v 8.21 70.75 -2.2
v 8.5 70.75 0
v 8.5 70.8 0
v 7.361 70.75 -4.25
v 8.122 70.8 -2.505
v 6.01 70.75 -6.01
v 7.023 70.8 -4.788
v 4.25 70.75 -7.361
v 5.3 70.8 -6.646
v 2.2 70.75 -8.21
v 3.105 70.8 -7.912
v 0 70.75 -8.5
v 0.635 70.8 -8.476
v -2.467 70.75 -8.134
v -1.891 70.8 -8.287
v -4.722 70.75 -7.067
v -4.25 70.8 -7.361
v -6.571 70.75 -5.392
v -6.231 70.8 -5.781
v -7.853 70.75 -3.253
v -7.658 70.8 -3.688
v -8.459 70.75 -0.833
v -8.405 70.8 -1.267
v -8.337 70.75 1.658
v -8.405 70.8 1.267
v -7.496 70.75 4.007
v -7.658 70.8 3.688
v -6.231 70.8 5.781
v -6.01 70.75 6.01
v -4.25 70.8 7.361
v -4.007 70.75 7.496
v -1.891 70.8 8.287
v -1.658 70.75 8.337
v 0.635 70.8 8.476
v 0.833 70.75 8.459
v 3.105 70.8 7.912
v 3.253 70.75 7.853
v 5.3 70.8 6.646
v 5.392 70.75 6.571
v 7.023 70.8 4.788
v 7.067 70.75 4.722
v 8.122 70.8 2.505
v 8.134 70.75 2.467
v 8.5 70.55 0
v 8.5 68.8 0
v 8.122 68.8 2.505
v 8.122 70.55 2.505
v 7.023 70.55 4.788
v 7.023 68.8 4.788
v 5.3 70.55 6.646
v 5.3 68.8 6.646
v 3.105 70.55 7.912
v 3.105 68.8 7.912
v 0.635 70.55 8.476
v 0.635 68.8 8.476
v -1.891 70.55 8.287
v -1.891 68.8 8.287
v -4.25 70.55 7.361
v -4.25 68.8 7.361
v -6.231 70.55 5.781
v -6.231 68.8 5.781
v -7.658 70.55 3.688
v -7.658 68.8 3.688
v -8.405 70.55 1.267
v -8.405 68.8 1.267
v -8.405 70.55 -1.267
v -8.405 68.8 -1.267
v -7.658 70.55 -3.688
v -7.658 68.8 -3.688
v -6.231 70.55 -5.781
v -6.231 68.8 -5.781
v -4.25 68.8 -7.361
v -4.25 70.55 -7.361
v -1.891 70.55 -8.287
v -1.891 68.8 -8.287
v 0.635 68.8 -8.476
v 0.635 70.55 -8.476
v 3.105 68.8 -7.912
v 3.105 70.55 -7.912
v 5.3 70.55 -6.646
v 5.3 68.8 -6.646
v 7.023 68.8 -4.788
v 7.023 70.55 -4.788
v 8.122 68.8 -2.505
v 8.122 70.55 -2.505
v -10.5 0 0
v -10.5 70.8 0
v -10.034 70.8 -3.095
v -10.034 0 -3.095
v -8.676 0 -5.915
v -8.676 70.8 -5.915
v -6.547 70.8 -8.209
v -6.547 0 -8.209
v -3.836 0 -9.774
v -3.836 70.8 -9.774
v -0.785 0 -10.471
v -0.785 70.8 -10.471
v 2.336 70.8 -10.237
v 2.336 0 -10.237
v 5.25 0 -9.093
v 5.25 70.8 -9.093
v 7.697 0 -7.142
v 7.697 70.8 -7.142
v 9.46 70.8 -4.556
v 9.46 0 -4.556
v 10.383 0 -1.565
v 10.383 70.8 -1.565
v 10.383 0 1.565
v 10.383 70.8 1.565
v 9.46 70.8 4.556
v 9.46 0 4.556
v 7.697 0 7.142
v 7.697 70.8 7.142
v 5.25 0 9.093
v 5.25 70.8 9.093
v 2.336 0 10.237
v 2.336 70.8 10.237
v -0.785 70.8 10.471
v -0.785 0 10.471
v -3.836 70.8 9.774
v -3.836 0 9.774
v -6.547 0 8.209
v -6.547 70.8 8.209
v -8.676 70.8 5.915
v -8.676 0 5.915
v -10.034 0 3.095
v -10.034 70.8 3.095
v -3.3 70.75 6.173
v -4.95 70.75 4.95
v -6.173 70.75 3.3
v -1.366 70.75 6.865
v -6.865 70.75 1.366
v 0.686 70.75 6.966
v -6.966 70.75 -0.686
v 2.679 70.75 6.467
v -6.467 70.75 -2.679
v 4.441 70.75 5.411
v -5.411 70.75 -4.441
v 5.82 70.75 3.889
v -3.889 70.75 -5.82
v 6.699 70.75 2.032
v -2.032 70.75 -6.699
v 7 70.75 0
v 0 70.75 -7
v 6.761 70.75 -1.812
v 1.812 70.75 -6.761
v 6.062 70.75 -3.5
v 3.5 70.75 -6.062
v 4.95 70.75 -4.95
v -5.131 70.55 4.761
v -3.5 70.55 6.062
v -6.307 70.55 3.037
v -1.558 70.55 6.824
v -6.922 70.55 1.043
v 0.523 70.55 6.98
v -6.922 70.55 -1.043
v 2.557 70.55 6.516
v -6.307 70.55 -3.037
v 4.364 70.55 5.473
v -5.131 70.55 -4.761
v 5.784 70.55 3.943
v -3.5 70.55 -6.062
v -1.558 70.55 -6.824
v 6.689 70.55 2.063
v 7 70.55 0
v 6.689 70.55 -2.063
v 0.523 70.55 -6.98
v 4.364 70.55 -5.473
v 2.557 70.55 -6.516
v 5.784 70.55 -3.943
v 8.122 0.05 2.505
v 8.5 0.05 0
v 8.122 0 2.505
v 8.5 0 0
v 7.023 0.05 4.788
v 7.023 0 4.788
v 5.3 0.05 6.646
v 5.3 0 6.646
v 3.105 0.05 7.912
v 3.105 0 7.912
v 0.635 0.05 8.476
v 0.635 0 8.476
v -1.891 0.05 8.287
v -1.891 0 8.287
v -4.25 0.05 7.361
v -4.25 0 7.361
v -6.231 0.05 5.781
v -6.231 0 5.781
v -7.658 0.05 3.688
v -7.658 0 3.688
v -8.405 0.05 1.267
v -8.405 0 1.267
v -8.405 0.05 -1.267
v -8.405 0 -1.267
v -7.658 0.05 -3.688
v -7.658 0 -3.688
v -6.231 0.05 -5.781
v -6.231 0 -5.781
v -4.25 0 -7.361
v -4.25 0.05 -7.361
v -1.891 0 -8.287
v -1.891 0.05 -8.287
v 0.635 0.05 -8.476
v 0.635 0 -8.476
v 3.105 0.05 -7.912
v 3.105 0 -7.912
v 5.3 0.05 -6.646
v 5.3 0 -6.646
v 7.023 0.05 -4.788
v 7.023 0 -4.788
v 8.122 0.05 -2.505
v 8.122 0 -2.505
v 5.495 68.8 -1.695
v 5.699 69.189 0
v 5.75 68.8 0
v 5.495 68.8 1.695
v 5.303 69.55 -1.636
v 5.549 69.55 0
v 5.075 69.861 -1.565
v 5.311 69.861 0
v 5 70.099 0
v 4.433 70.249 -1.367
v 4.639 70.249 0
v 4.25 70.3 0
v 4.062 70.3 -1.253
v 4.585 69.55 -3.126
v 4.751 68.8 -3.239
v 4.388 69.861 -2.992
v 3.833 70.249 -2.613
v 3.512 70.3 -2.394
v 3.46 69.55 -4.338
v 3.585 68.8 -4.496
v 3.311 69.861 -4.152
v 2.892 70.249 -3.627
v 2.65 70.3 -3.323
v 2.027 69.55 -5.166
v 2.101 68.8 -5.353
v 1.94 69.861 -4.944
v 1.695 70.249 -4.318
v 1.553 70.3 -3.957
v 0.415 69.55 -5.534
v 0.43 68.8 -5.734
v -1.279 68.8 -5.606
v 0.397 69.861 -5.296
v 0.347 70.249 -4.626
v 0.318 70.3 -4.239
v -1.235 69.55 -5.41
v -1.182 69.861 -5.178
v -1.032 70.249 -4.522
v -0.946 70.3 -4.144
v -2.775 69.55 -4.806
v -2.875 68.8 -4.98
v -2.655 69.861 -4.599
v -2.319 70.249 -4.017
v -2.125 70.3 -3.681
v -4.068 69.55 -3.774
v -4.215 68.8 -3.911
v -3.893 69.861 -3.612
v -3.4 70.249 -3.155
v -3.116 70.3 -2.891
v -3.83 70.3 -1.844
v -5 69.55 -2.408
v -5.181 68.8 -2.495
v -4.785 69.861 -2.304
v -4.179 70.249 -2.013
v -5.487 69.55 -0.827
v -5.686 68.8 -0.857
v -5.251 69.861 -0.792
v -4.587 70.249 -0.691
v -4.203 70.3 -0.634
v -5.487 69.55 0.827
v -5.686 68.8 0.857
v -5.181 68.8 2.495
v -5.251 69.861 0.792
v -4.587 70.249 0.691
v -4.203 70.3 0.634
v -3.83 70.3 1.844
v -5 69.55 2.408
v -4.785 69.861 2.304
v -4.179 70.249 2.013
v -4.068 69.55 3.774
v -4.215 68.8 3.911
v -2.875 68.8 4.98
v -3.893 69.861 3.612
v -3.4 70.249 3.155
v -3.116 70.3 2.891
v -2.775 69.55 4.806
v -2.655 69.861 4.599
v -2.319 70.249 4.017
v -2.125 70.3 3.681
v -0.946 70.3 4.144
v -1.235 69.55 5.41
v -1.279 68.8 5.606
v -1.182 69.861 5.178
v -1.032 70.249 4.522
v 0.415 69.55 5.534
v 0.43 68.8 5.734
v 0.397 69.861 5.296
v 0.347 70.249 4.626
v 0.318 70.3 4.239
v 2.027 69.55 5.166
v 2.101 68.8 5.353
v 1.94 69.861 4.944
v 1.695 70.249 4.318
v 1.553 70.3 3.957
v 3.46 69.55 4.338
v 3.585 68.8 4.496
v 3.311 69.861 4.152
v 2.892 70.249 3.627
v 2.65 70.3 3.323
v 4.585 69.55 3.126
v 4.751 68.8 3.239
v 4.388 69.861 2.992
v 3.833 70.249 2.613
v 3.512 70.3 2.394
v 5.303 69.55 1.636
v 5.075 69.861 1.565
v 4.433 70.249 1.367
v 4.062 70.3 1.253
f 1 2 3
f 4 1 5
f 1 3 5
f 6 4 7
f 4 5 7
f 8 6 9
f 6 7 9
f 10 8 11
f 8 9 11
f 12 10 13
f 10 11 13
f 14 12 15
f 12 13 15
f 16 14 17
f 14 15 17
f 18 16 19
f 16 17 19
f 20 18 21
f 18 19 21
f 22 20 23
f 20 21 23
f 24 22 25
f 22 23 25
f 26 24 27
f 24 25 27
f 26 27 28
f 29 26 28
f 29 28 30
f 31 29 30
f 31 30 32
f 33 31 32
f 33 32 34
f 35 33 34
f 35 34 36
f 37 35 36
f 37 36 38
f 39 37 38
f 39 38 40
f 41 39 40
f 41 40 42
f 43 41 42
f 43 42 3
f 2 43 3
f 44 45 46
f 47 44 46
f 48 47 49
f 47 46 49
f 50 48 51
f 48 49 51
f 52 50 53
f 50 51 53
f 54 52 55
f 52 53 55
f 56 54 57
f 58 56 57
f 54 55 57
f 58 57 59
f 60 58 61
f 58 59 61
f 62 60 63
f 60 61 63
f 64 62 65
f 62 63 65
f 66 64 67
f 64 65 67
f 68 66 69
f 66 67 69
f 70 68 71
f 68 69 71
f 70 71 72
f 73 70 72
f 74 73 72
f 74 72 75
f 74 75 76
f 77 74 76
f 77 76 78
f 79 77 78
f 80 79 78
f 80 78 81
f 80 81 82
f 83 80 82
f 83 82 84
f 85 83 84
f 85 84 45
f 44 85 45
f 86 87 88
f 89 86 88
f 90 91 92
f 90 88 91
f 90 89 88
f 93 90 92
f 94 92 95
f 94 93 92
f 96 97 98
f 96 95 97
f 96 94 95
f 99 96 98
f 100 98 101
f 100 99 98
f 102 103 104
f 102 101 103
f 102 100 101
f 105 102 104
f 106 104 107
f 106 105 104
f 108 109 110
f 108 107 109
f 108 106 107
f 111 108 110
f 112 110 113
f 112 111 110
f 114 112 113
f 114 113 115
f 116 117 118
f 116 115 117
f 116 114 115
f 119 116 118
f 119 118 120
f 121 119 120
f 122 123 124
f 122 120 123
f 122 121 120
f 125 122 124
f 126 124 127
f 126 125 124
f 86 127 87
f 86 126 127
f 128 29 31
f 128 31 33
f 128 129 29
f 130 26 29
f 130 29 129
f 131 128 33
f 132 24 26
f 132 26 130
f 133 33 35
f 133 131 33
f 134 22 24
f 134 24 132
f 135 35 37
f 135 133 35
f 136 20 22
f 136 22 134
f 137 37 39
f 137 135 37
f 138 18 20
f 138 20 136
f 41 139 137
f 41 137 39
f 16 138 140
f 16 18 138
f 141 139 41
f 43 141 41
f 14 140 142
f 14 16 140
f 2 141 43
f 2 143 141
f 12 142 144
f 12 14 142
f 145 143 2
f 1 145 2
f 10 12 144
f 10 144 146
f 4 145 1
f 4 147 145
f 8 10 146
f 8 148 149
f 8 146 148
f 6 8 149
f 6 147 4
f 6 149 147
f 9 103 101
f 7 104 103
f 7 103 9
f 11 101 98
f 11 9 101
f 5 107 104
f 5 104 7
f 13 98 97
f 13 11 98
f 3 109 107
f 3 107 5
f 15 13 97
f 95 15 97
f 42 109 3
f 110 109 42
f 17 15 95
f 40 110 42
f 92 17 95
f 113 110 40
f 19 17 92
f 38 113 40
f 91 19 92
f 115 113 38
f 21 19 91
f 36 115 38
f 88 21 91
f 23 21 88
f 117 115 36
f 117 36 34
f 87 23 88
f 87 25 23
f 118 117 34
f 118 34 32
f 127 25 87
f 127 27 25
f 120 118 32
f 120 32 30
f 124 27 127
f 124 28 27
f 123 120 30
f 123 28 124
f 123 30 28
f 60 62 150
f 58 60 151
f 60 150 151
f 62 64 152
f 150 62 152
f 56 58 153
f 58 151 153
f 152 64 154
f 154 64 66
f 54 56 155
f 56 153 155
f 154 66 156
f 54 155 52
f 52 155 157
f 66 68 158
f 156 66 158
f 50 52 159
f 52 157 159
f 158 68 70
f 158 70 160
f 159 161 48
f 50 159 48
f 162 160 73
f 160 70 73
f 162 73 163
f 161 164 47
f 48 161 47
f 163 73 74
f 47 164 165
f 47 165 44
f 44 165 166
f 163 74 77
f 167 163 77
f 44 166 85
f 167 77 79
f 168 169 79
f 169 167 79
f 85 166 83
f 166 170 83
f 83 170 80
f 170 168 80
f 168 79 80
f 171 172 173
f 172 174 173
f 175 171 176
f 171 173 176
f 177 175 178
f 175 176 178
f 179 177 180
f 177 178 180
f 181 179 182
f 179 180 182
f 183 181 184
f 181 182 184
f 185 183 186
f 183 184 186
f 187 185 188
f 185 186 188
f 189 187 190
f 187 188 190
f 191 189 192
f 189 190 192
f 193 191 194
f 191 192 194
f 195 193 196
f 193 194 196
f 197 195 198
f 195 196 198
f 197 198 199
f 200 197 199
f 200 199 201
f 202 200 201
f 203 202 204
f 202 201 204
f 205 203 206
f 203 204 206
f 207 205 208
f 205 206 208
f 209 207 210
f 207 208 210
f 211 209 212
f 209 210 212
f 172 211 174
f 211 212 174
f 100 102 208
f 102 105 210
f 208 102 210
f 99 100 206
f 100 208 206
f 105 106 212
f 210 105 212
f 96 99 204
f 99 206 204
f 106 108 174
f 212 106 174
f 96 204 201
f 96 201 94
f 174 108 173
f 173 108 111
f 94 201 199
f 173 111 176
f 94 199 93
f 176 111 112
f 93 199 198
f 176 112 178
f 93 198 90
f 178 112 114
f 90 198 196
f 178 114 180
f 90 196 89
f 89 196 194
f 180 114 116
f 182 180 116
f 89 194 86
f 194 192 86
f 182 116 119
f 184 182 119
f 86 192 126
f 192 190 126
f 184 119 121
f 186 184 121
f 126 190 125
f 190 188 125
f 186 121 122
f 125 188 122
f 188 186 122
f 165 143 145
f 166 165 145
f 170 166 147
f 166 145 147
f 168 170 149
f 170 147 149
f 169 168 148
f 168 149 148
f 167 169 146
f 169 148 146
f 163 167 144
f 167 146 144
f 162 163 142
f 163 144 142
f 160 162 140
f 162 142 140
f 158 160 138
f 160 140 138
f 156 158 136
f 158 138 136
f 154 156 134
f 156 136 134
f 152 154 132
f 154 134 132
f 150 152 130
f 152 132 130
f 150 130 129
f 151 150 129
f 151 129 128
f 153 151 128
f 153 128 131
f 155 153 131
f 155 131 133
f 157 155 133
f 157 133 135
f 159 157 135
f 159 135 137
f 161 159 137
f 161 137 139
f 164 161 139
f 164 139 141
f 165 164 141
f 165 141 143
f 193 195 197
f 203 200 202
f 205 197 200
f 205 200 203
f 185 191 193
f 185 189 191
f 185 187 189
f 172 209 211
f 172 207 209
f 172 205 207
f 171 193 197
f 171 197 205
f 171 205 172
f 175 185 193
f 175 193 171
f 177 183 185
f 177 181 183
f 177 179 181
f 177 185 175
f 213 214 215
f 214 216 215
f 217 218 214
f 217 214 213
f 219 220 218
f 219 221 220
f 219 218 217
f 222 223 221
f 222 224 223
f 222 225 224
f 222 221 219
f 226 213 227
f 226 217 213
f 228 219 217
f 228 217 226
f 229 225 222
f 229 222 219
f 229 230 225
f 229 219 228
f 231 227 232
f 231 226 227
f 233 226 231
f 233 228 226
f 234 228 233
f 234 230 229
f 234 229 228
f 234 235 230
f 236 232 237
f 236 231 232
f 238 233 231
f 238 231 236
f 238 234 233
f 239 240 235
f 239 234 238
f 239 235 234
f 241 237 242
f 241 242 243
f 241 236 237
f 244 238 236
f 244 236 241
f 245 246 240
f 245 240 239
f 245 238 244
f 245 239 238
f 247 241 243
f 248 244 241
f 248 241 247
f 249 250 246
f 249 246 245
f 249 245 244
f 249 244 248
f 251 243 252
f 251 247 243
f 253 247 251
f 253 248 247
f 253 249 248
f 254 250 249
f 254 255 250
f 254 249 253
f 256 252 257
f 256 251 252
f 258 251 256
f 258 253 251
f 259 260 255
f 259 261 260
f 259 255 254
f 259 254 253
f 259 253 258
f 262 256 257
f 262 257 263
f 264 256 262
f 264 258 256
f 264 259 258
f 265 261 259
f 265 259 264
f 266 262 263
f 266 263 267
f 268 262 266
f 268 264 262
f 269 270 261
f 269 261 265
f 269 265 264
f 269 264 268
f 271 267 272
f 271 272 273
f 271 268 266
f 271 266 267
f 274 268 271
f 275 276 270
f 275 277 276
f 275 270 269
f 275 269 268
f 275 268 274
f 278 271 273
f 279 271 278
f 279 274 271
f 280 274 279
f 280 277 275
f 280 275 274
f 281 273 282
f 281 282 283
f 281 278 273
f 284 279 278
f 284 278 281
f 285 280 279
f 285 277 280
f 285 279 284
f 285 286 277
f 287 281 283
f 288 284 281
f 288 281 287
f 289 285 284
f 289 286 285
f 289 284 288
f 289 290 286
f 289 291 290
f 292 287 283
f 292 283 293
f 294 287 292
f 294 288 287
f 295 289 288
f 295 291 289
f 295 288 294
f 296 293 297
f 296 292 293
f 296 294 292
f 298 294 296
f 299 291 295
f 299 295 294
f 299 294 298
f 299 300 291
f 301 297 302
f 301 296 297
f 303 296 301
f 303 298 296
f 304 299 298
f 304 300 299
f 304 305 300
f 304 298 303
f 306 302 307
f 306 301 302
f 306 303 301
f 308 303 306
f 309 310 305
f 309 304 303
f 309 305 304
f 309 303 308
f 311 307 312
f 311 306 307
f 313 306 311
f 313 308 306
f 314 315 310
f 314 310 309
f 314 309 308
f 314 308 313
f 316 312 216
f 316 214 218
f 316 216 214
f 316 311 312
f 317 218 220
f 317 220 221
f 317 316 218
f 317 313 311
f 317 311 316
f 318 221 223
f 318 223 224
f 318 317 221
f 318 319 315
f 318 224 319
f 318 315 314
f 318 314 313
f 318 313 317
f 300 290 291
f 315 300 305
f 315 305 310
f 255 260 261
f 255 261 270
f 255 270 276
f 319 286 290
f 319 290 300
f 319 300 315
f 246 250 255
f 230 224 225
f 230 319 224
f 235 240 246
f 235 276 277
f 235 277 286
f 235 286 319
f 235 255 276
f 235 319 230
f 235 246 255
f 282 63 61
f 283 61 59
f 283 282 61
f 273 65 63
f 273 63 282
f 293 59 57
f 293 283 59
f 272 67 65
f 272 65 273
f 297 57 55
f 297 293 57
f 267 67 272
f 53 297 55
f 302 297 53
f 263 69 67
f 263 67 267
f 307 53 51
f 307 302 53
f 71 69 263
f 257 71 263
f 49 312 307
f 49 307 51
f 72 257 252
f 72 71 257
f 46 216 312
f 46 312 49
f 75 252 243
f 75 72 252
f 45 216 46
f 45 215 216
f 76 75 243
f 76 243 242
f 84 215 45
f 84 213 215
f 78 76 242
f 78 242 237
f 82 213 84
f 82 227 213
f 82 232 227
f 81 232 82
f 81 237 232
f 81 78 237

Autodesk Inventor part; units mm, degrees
ref_plane "YZ Plane" through (0, 0, 0) normal (1, 0, 0) x (0, 1, 0)
ref_plane "XZ Plane" through (0, 0, 0) normal (0, 1, 0) x (-1, 0, 0)
ref_plane "XY Plane" through (0, 0, 0) normal (0, 0, 1) x (1, 0, 0)
sketch "Sketch1" plane through (0, 0, 0) normal (0, 1, 0) x (-1, 0, 0)
  circle A0 centre (0, 0) radius 10.5
  dimension "d0" = 21
extrude "Extrusion1" add sketch "Sketch1" along normal blind 70.8
sketch "Sketch2" plane through (0, 70.8, 0) normal (0, 1, 0) x (1, 0, 0)
  circle A0 centre (0, 0) radius 10.5 projected
  line L0 (-10.5, 0) -> (-7, 0)
  circle A1 centre (0, 0) radius 7
  dimension "d3" = 3.5
extrude "Extrusion2" cut sketch "Sketch2" against normal blind 2 contours A1
sketch "Sketch3" plane through (0, 68.8, 0) normal (0, 1, 0) x (1, 0, 0)
  circle A0 centre (0, 0) radius 10.5 projected
  line L0 (-10.5, 0) -> (-8.5, 0)
  circle A1 centre (0, 0) radius 8.5
  dimension "d6" = 2
extrude "Extrusion3" cut sketch "Sketch3" along normal blind 1.75 contours A1
sketch "Sketch4" plane through (0, 68.8, 0) normal (0, 1, 0) x (1, 0, 0)
  circle A0 centre (0, 0) radius 5.75
  dimension "d9" = 11.5
extrude "Extrusion4" add sketch "Sketch4" along normal blind 1.5
fillet "Fillet1" radius 1.5 1 edges at (-5.75, 70.3, 0)
sketch "Sketch5" plane through (0, 70.8, 0) normal (0, 1, 0) x (1, 0, 0)
  circle A0 centre (0, 0) radius 7
  circle A1 centre (0, 0) radius 7 projected
  line L0 (0, 7) -> (0, 8.5)
  circle A2 centre (0, 0) radius 8.5 projected
  circle A3 centre (0, 0) radius 4.25 projected
  circle A4 centre (0, 0) radius 8.5
extrude "Extrusion5" cut sketch "Sketch5" against normal blind 0.05 contours A2
sketch "Sketch6" plane through (0, 0, 0) normal (0, -1, 0) x (1, 0, 0)
  circle A0 centre (0, 0) radius 10.5 projected
  line L0 (0, 10.5) -> (0, 8.5)
  circle A1 centre (0, 0) radius 8.5 projected
  circle A2 centre (0, 0) radius 8.5
  circle A3 centre (0, 0) radius 10.5
extrude "Extrusion6" cut sketch "Sketch6" against normal blind 0.05 contours A1
properties part number "baterka"
